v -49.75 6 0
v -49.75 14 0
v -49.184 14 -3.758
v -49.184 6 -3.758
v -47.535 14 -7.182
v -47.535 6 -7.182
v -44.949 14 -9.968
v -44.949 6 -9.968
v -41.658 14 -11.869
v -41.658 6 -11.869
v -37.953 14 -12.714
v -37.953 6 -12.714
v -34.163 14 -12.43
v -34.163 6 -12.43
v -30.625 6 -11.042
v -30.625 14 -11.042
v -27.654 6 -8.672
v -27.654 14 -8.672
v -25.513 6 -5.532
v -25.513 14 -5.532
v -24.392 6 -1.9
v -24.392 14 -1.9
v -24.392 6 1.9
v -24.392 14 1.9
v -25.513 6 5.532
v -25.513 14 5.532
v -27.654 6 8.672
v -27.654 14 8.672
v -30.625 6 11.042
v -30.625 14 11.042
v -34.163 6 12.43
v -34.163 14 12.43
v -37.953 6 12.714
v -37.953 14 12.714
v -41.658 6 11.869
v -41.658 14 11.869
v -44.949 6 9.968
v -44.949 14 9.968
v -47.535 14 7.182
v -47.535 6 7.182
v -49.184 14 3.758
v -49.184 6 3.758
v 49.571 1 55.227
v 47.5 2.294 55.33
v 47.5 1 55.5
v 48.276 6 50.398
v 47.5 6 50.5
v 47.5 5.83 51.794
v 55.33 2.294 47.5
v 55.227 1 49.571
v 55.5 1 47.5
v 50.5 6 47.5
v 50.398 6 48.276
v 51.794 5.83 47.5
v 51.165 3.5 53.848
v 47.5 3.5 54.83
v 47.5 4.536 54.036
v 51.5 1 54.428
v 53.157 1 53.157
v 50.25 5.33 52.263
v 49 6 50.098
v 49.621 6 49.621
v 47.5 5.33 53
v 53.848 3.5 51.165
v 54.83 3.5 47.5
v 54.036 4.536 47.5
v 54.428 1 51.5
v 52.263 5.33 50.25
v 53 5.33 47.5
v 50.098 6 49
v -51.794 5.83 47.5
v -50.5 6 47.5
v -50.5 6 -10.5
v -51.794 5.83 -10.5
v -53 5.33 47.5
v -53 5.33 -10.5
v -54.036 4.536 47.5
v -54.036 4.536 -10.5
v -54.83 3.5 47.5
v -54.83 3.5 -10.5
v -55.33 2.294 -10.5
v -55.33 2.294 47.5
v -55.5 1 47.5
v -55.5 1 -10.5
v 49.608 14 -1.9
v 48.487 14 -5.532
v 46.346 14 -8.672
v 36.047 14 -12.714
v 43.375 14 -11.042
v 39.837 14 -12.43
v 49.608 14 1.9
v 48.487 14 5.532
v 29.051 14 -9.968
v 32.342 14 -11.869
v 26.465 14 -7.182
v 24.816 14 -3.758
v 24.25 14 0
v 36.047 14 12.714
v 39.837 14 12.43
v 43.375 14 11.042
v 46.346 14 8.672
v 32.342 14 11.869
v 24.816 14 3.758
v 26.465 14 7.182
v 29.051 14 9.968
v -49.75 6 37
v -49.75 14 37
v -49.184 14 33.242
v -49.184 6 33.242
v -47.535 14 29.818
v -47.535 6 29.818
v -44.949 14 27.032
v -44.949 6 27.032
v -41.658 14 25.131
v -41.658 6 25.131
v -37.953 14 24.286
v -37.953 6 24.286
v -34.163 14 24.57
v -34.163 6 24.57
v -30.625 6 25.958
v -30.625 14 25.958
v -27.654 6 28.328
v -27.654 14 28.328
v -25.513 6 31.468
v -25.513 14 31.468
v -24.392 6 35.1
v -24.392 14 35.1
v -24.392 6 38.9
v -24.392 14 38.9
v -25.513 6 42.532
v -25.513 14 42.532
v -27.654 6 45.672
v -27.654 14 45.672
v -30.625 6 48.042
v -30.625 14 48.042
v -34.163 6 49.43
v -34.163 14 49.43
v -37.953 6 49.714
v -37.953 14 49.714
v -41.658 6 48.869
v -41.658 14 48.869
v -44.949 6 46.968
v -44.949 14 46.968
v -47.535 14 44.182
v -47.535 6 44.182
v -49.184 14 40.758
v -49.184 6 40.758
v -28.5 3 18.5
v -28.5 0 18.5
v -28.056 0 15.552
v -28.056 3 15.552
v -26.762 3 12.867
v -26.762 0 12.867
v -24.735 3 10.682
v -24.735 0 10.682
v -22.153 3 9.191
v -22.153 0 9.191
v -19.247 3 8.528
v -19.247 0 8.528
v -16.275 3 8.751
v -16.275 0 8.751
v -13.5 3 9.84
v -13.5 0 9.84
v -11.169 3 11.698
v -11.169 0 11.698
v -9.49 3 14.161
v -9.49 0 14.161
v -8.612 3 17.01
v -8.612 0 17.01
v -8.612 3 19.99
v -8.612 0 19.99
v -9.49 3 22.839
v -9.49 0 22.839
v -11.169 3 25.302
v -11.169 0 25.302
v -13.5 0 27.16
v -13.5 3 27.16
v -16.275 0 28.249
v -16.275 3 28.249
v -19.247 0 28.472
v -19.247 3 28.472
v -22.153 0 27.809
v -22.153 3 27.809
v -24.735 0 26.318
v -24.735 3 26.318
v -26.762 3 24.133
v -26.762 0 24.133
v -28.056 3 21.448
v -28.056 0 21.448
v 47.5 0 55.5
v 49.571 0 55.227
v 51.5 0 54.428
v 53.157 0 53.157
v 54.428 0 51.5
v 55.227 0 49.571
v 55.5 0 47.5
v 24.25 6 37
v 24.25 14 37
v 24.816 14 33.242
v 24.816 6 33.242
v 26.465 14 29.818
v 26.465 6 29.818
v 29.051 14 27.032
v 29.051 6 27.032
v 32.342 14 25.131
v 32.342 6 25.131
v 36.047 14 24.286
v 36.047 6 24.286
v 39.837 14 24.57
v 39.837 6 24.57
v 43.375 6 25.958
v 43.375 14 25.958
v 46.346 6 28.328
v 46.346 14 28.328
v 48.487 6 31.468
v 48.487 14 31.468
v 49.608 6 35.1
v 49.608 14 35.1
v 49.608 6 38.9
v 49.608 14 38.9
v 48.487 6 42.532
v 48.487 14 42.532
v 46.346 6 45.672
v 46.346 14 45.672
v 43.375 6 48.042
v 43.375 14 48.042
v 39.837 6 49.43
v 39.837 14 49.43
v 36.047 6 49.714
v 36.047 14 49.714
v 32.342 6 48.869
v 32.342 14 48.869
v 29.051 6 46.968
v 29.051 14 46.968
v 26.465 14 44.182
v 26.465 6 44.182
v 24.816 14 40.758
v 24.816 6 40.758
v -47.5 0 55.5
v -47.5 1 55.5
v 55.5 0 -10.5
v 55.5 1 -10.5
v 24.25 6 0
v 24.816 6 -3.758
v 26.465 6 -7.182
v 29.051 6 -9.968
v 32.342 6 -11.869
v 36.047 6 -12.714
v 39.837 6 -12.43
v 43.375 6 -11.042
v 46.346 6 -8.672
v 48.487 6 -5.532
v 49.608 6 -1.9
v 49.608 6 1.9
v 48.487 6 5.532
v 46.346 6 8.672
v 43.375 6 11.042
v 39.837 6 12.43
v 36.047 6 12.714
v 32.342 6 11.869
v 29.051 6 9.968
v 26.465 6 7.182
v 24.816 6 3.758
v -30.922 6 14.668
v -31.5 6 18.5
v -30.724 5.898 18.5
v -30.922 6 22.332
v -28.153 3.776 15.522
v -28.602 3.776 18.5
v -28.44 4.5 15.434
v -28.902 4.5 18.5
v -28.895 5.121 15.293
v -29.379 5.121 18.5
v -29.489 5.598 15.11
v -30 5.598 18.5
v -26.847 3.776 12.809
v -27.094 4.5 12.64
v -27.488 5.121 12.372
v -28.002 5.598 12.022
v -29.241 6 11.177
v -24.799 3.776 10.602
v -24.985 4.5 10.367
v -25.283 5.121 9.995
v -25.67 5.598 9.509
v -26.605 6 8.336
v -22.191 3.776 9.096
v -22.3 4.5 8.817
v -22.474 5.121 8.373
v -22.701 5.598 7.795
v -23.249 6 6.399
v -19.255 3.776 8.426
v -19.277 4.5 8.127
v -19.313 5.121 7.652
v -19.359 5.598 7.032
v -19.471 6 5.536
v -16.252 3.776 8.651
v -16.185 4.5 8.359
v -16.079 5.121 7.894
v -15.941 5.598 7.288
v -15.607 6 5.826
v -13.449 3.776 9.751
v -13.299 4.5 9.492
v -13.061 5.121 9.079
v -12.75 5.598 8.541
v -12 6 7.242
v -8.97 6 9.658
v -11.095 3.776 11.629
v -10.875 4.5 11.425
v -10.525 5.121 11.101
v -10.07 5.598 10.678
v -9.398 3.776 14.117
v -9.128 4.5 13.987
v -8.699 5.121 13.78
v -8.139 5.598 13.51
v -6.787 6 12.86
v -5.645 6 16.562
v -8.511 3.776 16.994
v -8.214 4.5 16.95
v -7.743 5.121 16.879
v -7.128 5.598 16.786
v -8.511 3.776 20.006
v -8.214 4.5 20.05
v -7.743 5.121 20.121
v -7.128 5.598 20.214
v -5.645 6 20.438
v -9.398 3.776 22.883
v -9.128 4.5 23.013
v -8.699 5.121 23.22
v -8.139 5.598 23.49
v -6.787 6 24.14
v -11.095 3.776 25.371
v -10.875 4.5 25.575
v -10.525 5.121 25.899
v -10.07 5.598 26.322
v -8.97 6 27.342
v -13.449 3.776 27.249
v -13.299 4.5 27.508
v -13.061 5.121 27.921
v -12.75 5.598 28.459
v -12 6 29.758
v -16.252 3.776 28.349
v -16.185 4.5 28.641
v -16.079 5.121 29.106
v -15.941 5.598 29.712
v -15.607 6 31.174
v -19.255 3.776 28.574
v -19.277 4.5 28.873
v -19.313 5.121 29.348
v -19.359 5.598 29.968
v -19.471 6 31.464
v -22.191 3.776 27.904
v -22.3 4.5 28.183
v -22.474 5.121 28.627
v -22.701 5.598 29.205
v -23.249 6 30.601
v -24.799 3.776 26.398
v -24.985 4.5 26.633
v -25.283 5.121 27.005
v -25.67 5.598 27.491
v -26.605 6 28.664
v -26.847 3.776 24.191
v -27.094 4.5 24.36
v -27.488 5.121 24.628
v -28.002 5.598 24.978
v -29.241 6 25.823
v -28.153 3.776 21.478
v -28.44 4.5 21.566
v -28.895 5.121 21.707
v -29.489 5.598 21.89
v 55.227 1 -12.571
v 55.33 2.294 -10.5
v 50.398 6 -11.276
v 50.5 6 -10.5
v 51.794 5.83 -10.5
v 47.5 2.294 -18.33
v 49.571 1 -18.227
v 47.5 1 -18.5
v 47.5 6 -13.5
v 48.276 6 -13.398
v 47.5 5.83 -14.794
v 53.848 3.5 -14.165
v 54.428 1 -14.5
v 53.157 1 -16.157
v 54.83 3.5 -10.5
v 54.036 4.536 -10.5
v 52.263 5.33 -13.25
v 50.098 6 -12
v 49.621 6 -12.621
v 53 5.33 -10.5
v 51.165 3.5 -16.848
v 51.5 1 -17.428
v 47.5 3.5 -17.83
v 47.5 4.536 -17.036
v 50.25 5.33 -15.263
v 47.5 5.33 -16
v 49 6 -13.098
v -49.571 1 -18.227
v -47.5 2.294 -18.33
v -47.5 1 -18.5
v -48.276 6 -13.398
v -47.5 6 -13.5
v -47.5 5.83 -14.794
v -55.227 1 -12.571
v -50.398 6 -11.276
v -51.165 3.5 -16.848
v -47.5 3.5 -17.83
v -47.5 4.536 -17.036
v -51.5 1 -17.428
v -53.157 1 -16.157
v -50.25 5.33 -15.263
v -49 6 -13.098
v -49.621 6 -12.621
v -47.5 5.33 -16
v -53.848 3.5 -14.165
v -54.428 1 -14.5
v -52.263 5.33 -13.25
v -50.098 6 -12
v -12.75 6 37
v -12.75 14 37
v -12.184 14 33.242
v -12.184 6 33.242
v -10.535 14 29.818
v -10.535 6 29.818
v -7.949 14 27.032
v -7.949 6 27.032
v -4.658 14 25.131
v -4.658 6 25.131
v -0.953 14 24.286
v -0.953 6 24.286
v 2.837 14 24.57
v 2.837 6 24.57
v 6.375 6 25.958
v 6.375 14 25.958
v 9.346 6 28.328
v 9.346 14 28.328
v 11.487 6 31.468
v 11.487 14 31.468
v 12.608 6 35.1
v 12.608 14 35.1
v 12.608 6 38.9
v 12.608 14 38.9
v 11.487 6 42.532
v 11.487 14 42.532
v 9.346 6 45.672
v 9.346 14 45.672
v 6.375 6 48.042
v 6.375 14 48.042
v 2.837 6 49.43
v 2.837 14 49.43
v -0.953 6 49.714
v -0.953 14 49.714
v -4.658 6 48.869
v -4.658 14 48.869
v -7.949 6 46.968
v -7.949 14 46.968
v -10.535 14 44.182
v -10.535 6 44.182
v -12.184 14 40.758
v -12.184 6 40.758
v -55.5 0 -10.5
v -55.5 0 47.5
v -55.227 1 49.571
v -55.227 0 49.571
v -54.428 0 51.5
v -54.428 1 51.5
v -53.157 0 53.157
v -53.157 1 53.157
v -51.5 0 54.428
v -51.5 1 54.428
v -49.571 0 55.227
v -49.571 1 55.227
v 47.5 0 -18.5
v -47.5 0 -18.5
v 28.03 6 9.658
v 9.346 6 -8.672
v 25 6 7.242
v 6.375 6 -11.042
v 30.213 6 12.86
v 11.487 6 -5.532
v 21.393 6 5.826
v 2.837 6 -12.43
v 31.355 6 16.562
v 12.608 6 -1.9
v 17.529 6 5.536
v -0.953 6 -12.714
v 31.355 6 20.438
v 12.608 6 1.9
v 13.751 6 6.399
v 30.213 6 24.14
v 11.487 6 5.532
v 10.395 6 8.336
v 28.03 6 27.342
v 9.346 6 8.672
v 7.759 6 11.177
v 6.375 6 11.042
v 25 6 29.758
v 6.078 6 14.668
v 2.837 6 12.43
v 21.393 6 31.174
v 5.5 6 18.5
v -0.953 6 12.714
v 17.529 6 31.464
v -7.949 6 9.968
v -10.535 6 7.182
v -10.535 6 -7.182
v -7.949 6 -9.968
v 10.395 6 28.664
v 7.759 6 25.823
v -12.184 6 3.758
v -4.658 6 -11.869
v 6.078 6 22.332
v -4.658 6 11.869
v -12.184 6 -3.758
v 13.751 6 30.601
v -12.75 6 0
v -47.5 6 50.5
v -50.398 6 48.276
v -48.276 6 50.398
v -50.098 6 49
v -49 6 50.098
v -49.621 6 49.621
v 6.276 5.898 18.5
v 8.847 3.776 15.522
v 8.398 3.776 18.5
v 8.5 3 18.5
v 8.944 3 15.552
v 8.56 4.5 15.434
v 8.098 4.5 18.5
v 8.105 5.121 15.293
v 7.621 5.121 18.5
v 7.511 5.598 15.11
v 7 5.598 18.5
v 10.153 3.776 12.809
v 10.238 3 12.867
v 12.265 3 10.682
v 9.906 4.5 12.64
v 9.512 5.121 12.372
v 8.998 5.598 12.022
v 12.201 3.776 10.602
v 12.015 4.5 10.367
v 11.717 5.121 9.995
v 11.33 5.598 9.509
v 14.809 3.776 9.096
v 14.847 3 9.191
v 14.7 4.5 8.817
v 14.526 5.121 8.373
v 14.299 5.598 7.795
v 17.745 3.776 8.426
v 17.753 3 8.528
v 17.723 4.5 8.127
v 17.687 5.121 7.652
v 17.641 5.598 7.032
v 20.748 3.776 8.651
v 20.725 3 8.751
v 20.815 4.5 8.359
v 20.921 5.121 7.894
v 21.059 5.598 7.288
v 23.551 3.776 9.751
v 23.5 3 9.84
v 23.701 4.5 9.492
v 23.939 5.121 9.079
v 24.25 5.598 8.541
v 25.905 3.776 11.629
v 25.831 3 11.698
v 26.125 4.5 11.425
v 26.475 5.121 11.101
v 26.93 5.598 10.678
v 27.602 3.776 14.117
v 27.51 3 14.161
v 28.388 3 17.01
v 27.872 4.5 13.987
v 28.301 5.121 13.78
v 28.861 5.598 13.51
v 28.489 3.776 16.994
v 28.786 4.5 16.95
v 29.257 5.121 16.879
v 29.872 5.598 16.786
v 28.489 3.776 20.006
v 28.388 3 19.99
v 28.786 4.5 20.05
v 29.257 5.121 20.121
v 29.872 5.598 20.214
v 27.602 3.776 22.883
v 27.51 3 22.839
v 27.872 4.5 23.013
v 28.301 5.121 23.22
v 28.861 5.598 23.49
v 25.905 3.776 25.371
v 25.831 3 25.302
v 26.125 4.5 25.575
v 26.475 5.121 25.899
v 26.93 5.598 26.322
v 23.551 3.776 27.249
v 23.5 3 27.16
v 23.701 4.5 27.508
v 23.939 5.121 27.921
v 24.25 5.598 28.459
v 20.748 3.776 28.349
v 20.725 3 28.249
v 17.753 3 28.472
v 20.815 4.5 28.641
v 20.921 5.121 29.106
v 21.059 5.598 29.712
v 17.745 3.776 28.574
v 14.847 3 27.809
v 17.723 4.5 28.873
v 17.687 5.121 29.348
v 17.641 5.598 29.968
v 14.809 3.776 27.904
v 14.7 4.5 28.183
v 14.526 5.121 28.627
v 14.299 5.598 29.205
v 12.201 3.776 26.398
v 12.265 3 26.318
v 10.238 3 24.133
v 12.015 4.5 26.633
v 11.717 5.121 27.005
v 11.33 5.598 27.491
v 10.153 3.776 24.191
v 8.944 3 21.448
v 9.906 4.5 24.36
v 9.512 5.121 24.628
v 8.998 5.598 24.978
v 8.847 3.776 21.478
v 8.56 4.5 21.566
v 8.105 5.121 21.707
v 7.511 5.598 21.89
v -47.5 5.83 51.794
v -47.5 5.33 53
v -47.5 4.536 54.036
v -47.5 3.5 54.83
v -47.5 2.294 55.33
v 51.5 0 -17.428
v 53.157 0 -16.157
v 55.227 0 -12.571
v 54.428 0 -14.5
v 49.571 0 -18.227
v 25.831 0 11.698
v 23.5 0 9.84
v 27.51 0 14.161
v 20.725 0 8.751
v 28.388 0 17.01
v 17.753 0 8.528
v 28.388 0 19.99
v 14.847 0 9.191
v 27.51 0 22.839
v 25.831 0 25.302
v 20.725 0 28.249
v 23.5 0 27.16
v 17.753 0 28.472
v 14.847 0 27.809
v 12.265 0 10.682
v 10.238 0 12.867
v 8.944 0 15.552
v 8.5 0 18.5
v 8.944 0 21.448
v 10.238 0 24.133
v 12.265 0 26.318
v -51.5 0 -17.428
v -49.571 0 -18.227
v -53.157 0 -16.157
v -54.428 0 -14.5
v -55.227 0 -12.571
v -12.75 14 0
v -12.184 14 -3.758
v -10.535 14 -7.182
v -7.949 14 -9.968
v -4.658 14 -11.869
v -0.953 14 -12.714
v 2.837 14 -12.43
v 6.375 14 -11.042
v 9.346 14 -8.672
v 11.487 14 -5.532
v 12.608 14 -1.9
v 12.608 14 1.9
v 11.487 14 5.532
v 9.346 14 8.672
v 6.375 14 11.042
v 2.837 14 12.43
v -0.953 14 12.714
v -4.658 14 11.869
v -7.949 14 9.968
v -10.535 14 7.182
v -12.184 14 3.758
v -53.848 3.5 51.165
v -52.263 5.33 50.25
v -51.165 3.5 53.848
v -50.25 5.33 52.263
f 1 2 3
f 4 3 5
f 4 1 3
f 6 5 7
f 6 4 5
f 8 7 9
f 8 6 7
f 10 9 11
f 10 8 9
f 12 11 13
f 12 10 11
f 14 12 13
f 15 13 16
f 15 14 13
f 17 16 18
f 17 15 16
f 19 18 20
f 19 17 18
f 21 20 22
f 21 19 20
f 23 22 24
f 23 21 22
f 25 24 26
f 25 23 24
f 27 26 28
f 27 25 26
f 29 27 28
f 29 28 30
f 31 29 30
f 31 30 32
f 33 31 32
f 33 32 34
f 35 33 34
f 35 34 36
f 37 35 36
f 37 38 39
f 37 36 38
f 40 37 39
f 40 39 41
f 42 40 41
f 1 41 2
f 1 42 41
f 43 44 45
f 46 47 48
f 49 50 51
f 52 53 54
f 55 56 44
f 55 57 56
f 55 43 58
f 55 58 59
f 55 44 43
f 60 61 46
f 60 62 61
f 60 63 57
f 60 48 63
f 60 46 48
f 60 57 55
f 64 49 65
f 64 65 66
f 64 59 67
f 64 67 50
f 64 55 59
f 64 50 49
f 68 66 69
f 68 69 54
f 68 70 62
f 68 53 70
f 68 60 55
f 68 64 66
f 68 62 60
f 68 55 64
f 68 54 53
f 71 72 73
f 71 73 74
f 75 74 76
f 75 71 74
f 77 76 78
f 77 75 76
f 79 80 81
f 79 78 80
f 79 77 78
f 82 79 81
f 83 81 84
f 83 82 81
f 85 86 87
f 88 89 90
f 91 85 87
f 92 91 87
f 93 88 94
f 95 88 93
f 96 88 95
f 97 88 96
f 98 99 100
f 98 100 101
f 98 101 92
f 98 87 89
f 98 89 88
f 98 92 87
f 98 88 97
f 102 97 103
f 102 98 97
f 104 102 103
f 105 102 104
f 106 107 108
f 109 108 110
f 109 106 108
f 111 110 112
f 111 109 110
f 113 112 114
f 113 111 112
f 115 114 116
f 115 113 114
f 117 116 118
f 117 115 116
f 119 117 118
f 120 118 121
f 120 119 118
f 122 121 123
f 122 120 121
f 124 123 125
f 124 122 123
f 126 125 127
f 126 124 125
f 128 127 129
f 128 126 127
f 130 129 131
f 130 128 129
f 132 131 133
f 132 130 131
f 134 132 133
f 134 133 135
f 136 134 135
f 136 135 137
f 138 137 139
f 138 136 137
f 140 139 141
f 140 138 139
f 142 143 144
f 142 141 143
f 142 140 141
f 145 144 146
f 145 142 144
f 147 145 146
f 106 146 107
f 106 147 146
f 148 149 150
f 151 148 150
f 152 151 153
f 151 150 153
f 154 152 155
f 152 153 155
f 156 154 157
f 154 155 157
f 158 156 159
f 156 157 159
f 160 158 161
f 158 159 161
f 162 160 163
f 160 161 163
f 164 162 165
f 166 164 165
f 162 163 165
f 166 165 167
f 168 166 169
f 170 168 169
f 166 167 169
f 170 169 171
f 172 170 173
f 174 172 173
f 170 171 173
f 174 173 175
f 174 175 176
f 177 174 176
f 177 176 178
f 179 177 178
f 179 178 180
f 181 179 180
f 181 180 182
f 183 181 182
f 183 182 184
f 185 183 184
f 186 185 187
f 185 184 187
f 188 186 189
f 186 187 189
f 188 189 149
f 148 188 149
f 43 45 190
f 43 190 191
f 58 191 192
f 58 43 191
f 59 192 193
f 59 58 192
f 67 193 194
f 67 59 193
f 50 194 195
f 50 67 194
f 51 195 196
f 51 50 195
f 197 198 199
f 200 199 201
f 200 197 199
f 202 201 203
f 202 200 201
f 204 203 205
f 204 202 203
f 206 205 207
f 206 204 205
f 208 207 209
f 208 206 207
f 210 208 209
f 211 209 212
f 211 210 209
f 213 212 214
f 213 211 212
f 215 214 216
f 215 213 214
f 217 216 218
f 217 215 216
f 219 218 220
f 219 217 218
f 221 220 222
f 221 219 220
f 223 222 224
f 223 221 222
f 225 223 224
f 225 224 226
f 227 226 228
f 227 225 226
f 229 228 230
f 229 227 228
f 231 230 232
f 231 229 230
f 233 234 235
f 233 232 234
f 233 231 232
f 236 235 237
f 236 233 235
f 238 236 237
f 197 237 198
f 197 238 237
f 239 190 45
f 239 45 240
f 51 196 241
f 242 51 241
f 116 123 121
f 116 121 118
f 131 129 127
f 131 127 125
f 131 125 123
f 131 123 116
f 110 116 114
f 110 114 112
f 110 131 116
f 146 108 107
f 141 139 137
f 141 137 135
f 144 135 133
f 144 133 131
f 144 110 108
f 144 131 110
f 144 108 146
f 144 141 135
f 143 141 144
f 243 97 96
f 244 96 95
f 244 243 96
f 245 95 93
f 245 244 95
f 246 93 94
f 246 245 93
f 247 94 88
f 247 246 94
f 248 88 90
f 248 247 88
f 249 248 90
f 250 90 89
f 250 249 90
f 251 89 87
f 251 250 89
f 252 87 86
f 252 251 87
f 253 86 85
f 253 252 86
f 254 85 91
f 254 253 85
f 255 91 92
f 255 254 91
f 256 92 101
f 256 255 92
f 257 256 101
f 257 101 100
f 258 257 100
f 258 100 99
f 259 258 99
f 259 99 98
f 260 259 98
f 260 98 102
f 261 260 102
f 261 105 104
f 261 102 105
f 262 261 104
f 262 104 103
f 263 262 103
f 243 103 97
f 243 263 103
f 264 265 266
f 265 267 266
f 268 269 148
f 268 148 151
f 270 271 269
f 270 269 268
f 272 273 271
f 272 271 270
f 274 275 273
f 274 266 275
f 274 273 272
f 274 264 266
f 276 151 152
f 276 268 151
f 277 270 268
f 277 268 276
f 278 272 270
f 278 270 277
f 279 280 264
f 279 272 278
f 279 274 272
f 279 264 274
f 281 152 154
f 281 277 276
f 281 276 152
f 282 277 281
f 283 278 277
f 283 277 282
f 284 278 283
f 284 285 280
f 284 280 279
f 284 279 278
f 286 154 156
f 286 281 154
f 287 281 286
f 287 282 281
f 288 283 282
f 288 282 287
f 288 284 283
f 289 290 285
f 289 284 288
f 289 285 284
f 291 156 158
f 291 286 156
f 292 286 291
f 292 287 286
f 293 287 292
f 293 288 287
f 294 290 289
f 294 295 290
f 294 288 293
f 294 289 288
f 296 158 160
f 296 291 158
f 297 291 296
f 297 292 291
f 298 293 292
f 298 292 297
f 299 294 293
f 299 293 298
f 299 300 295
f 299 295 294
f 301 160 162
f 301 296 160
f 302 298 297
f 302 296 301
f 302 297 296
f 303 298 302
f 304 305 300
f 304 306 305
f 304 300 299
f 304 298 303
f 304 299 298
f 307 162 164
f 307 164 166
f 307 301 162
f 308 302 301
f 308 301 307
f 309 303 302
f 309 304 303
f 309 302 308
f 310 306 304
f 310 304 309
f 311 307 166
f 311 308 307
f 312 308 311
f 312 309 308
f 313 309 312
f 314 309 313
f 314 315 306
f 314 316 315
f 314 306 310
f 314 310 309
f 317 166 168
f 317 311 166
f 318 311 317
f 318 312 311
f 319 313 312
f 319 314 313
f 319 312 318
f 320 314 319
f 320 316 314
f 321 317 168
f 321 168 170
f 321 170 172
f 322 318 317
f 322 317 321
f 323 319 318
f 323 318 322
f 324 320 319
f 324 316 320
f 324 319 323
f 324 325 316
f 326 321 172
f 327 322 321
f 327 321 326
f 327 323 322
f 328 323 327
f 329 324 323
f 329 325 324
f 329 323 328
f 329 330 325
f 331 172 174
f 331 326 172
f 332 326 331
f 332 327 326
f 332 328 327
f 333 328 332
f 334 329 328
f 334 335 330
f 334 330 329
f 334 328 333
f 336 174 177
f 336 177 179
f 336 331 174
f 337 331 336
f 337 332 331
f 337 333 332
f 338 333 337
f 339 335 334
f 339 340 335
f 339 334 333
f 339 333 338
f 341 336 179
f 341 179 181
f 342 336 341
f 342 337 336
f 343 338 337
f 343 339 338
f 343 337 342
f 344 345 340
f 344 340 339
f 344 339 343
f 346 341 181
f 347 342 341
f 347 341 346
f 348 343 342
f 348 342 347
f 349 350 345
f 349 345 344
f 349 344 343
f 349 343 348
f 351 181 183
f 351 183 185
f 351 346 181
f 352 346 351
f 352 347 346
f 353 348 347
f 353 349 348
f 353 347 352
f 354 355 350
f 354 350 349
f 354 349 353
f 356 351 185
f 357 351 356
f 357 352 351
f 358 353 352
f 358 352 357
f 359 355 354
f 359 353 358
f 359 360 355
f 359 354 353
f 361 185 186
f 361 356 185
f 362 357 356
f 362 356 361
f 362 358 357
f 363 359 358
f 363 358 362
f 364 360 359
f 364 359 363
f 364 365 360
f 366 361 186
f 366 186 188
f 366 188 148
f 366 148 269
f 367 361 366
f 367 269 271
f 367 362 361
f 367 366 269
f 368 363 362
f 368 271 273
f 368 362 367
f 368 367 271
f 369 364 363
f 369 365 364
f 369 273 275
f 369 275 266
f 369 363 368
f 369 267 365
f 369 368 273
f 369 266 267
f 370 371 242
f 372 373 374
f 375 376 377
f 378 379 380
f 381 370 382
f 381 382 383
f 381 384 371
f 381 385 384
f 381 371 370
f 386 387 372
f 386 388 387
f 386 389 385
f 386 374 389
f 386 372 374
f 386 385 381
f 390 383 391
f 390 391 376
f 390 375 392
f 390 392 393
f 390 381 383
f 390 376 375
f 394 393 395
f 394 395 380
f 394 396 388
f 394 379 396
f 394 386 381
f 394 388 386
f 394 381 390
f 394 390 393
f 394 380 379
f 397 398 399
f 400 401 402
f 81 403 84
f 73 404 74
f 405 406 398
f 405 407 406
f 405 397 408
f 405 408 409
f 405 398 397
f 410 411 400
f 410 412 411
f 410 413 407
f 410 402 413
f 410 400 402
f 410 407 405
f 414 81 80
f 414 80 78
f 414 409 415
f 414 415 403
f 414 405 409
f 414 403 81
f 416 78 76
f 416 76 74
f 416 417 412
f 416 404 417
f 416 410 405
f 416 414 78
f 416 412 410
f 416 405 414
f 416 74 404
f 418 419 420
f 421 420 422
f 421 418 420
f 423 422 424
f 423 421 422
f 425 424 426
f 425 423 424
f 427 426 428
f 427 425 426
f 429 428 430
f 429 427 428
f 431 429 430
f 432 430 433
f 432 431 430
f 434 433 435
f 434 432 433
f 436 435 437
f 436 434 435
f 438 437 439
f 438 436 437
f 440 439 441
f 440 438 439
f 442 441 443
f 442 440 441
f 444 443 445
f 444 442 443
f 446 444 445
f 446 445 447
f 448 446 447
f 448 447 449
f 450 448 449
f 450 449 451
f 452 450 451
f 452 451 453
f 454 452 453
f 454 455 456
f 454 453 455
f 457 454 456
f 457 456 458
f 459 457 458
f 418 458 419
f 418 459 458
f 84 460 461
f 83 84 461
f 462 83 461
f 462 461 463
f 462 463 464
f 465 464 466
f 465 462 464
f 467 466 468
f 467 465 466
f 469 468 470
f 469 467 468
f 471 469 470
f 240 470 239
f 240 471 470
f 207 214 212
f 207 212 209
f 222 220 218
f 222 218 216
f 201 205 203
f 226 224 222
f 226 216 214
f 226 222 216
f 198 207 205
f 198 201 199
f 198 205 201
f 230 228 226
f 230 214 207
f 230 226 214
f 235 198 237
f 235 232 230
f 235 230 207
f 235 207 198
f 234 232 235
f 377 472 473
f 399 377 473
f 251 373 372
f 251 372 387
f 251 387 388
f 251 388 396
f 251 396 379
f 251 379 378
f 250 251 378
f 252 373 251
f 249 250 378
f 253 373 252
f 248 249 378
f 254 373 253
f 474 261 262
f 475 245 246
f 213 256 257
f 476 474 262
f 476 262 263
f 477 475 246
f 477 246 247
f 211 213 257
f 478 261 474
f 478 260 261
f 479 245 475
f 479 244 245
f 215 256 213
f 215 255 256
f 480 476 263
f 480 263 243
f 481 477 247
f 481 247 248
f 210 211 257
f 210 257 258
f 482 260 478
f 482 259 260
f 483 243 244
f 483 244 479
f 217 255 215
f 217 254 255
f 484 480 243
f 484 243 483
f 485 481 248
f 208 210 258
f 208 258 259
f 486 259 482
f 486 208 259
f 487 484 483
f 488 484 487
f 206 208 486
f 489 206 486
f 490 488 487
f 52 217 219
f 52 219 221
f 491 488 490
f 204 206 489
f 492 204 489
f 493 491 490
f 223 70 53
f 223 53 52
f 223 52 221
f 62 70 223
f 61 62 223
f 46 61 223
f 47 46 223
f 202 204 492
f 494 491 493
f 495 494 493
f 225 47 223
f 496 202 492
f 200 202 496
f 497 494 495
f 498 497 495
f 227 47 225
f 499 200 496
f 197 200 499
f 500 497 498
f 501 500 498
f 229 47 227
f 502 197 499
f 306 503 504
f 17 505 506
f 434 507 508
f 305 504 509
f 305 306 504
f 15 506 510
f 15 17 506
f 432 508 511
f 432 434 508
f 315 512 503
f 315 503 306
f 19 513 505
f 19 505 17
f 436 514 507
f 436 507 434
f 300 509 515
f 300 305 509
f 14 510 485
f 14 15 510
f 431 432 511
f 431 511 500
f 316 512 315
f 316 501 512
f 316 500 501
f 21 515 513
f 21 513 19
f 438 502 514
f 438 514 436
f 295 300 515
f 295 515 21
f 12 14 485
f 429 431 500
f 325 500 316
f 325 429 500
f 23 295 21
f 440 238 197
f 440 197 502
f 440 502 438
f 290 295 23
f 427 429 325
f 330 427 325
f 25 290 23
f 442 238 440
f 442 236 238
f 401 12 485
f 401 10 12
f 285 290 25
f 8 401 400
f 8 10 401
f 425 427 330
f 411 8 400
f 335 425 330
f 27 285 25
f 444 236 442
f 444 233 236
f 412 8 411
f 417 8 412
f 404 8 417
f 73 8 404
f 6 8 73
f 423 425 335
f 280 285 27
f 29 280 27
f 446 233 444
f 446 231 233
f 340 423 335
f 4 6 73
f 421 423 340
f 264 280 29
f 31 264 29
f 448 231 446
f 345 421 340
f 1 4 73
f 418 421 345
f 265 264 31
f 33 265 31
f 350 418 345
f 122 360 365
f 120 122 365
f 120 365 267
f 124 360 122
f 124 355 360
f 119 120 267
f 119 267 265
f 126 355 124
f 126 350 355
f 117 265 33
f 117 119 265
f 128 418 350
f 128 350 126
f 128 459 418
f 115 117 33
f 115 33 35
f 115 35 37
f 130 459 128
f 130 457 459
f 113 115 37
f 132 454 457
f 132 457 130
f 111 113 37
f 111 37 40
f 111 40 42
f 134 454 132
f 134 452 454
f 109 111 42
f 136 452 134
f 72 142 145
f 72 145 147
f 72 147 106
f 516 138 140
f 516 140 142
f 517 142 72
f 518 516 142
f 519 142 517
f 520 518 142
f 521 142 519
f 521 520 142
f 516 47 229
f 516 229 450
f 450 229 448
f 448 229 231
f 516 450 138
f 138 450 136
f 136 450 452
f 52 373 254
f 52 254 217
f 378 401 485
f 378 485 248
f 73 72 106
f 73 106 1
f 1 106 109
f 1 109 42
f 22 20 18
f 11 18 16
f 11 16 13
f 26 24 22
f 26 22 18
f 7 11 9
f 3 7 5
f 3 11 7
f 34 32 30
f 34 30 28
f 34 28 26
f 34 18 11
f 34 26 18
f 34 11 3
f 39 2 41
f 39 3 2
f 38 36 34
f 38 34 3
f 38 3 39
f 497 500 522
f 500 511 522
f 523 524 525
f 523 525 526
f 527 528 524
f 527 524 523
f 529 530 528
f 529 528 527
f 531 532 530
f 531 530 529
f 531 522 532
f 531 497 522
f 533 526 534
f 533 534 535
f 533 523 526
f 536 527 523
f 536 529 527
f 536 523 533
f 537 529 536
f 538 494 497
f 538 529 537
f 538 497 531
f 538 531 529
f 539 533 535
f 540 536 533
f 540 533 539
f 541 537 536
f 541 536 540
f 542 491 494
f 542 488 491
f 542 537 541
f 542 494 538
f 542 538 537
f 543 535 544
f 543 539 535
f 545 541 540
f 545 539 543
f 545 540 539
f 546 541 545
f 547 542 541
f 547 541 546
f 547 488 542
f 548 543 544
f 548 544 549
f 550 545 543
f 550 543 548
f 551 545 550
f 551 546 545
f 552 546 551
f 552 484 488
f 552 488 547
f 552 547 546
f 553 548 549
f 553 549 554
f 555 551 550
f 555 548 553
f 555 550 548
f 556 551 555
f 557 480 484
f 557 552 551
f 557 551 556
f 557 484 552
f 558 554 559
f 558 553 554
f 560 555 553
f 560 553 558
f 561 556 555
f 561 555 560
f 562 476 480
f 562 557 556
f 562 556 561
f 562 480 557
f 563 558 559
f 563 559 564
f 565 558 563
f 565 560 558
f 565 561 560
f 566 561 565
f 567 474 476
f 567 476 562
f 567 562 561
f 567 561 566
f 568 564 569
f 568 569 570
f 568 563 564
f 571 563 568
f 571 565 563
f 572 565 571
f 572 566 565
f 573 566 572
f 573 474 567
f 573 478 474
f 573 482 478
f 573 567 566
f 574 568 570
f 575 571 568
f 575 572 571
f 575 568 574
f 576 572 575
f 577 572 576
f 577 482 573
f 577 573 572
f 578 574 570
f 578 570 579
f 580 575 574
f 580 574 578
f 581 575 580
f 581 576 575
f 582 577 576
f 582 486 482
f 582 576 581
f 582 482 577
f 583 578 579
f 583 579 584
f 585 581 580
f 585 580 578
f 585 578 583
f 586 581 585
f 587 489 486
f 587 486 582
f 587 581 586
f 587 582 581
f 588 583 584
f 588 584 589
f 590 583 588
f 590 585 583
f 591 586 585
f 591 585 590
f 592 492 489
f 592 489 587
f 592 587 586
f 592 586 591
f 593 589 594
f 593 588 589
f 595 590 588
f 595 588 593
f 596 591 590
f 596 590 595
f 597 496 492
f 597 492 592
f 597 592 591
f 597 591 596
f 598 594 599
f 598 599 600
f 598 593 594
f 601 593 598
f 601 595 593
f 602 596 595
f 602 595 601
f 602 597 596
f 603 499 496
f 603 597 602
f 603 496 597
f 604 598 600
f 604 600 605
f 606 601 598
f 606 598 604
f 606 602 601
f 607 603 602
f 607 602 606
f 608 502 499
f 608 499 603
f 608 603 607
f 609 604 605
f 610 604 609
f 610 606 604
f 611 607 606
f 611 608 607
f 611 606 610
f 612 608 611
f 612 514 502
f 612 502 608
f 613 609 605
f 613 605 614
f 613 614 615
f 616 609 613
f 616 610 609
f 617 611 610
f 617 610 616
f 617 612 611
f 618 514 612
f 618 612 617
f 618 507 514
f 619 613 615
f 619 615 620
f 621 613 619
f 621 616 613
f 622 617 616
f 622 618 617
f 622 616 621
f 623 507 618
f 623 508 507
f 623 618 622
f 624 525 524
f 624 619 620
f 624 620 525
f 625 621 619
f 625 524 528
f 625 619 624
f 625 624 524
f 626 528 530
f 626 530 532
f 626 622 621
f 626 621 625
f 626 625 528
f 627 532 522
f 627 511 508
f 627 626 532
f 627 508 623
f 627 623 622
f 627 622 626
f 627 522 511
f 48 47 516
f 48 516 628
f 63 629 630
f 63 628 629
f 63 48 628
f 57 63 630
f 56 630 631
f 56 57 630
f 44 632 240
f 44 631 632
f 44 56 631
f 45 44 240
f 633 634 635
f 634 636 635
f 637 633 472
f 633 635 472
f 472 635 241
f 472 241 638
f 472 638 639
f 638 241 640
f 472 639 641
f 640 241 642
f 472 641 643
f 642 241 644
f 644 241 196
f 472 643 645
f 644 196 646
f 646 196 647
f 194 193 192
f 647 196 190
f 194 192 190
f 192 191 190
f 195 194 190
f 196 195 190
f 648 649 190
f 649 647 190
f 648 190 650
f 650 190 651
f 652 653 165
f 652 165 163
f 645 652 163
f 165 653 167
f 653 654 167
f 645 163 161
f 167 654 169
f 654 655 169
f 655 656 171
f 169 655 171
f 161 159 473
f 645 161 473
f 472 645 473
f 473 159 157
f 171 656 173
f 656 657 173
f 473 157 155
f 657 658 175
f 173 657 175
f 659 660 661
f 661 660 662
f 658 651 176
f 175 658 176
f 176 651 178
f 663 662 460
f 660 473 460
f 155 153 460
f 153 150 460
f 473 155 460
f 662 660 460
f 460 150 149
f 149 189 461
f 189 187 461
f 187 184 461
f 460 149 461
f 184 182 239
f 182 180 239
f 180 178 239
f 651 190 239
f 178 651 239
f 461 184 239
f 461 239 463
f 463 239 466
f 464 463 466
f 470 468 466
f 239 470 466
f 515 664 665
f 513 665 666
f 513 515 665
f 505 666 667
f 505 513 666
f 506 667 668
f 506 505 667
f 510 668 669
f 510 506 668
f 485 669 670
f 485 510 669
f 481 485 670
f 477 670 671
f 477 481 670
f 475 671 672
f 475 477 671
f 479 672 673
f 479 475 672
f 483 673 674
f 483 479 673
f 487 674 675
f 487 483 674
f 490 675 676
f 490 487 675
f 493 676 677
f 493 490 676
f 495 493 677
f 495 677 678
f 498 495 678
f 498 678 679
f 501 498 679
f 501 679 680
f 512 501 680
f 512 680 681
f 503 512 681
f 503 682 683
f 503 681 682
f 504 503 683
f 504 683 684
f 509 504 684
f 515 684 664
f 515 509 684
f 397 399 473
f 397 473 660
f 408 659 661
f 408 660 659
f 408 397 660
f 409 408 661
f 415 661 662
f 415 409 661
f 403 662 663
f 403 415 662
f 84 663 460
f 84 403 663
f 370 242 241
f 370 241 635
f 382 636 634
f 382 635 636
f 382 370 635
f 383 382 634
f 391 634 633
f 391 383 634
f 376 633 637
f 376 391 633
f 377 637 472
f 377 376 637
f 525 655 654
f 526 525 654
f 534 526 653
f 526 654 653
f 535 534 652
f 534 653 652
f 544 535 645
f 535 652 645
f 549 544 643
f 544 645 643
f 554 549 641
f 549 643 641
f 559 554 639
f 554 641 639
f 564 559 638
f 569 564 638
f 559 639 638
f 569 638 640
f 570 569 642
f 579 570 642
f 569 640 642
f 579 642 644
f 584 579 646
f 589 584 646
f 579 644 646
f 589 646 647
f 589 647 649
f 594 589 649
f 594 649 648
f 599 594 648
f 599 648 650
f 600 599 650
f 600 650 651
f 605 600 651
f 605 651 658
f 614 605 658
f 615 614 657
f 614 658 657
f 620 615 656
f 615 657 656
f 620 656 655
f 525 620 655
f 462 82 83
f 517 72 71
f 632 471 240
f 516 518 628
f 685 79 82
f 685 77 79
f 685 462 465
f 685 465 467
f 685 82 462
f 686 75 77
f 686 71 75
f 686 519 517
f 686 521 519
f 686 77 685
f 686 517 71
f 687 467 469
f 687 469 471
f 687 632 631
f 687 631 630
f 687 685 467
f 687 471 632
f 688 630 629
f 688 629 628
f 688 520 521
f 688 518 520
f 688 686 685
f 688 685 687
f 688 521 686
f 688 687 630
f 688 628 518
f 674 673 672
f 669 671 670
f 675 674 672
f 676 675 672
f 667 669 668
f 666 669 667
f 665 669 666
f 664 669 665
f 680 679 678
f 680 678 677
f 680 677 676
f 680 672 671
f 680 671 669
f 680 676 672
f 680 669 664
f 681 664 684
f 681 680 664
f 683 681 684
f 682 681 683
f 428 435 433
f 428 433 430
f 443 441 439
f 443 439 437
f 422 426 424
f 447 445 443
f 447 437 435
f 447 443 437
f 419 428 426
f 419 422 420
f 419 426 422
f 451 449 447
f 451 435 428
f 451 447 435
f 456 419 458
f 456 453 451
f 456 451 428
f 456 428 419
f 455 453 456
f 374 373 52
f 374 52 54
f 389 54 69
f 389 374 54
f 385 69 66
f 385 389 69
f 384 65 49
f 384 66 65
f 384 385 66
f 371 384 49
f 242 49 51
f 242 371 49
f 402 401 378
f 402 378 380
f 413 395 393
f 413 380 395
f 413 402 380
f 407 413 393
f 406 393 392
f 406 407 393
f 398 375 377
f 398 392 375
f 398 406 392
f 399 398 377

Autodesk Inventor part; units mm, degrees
ref_plane "YZ Plane" through (0, 0, 0) normal (1, 0, 0) x (0, 1, 0)
ref_plane "XZ Plane" through (0, 0, 0) normal (0, 1, 0) x (-1, 0, 0)
ref_plane "XY Plane" through (0, 0, 0) normal (0, 0, 1) x (1, 0, 0)
sketch "Sketch1" plane through (0, 0, 0) normal (0, 1, 0) x (-1, 0, 0)
  line L0 (25.9, 0) -> (-25.9, 0) projected
  line L1 (0, -25.9) -> (0, 25.9) projected
  circle A0 centre (0, 0) radius 18.5 construction
  circle A1 centre (0, 0) radius 13 construction
  dimension "d0" = 37
  dimension "d1" = 26
sketch "Sketch2" plane through (0, 0, 0) normal (0, 1, 0) x (-1, 0, 0)
  line L0 (77.7, 0) -> (-77.7, 0) projected
  line L1 (0, -33.3) -> (0, 70.3) projected
  line L2 (-55.5, 55.5) -> (-55.5, -18.5)
  line L3 (-55.5, -18.5) -> (55.5, -18.5)
  line L4 (55.5, -18.5) -> (55.5, 55.5)
  line L5 (-55.5, 55.5) -> (55.5, 55.5)
  circle A0 centre (0, 37) radius 18.5 construction
  point P0 (0, 0)
  dimension "d3" = 111
  dimension "d29" = 18.5
  dimension "d30" = 55.5
  dimension "d99" = 37
  dimension "d100" = 37
extrude "Extrusion1" add sketch "Sketch2" along normal blind 6
sketch "Sketch6" plane through (0, 0, 0) normal (0, 1, 0) x (-1, 0, 0)
  line L0 (55.5, -18.5) -> (-55.5, -18.5) projected
  line L1 (55.5, 55.5) -> (55.5, -18.5) projected
  line L2 (-55.5, -18.5) -> (55.5, -18.5)
  line L3 (55.5, -18.5) -> (55.5, 55.5)
  line L4 (-55.5, 55.5) -> (-55.5, -18.5)
  line L5 (84.7, 0) -> (-84.7, 0) projected
  line L6 (0, -36.3) -> (0, 70.8) projected
  arc A0 (-16, 0) -> (16, 0) centre (0, 0) ccw
  line L7 (16, 0) -> (16, 55.5)
  line L8 (55.5, 55.5) -> (-55.5, 55.5) projected
  line L9 (16, 55.5) -> (55.5, 55.5)
  line L10 (-16, 0) -> (-16, 55.5)
  line L11 (-16, 55.5) -> (-55.5, 55.5)
  point P0 (-17.3617, -21)
  dimension "d18" = 32
extrude "Extrusion5" [suppressed]
sketch "Sketch4" plane through (0, 0, 0) normal (0, 0, 1) x (1, 0, 0)
  line L0 (-18.5, 0) -> (18.5, 0)
  line L1 (18.5, 0) -> (18.5, -2)
  line L2 (18.5, -2) -> (-18.5, -2)
  line L3 (-18.5, -2) -> (-18.5, 0)
  line L4 (-25.9, 0) -> (25.9, 0) projected
  line L5 (0, -2.4) -> (0, 0.4) projected
  point P0 (0, 0)
  dimension "d10" = 37
  dimension "d11" = 2
extrude "Extrusion6" [suppressed]
sketch "Sketch5" plane through (0, 0, 0) normal (0, 1, 0) x (-1, 0, 0)
  circle A0 centre (0, 0) radius 18.5 construction
  circle A1 centre (0, 0) radius 18.5 construction
  line L0 (25.9, 0) -> (-25.9, 0) projected
  line L1 (0, -28.9) -> (0, 26.4) projected
  line L2 (-18.5, -21) -> (18.5, -21)
  line L3 (18.5, -21) -> (18.5, -18.5)
  line L4 (18.5, -18.5) -> (-18.5, -18.5)
  line L5 (-18.5, -18.5) -> (-18.5, -21)
  dimension "d25" = 37
  dimension "d26" = 21
extrude "Extrusion7" [suppressed]
sketch "Sketch7" plane through (0, 0, 0) normal (0, 0, 1) x (1, 0, 0)
  line L0 (-18.5, 0) -> (18.5, 0)
  line L1 (18.5, 0) -> (18.5, -2)
  line L2 (18.5, -2) -> (-18.5, -2)
  line L3 (-18.5, -2) -> (-18.5, 0)
  line L4 (55.5, 0) -> (-55.5, 0) projected
  line L5 (-84.7, 0) -> (84.7, 0) projected
  line L6 (0, -2.4) -> (0, 0.4) projected
  point P0 (-16, 0)
  point P1 (16, 0)
  dimension "d53" = 2
  dimension "d54" = 18.5
extrude "Extrusion8" [suppressed]
sketch "Sketch8" plane through (0, 0, 0) normal (0, 1, 0) x (-1, 0, 0)
  circle A0 centre (0, 0) radius 12.75
  dimension "d34" = 25.5
extrude "Extrusion9" add sketch "Sketch8" along normal blind 14
pattern_linear "Rectangular Pattern1" count 2 spacing 37 along (0, 0, 1) count 3 spacing 37 along (1, 0, 0) of "Extrusion9" second direction both ways yes
sketch "Sketch9" plane through (0, 6, 0) normal (0, 1, 0) x (1, 0, 0)
  circle A0 centre (0, 0) radius 13
  circle A1 centre (0, 0) radius 15
  dimension "d40" = 26
  dimension "d41" = 30
extrude "Extrusion10" [suppressed]
sketch "Sketch10" plane through (0, 5, 0) normal (0, 1, 0) x (1, 0, 0)
  arc A0 (16, 0) -> (-16, 0) centre (0, 0) ccw projected
  line L0 (1.5, -18) -> (-1.5, -18)
  line L1 (-29.4, 0) -> (29.4, 0) projected
  line L2 (0, 36.3) -> (0, -70.8) projected
  line L3 (1.5, -12) -> (-1.5, -12)
  line L4 (1.5, -12) -> (1.5, -18)
  line L5 (-1.5, -18) -> (-1.5, -12)
  dimension "d48" = 3
  dimension "d49" = 12
  dimension "d50" = 6
extrude "Extrusion11" [suppressed]
fillet "Fillet1" [suppressed]
sketch "Sketch11" plane through (0, 0, 0) normal (0, 1, 0) x (-1, 0, 0)
  line L0 (-60.5, -21) -> (60.5, -21)
  line L1 (60.5, -21) -> (60.5, -47)
  line L2 (60.5, -47) -> (-60.5, -47)
  line L3 (-60.5, -47) -> (-60.5, -21)
  line L4 (84.7, 0) -> (-84.7, 0) projected
  line L5 (0, -60.1) -> (0, 31.6) projected
  point P0 (0, 0)
  dimension "d57" = 26
  dimension "d58" = 21
  dimension "d59" = 121
extrude "Extrusion12" [suppressed]
sketch "Sketch12" plane through (0, 0, 0) normal (1, 0, 0) x (0, 1, 0)
  line L0 (6, 55.5) -> (6, -18.5) projected
  arc A0 (6, -16.5081) -> (5.7334, -47) centre (34, -32) ccw
  line L1 (-6.8, 0) -> (40.8, 0) projected
  line L2 (0, -67.5) -> (0, 76) projected
  line L3 (6, -16.5081) -> (6, -47)
  line L4 (6, -47) -> (5.7334, -47)
  line L5 (0, -47) -> (6, -47) projected
  point P0 (0, 0)
  point P1 (6, 48)
  dimension "d62" = 32
  dimension "d63" = 32
  dimension "d64" = 34
extrude "Extrusion13" [suppressed]
fillet "Fillet3" [suppressed]
sketch "Sketch13" plane through (0, 0, 0) normal (0, 1, 0) x (-1, 0, 0)
  line L0 (84.7, 0) -> (-84.7, 0) projected
  line L1 (0, -67.5) -> (0, 76) projected
  line L2 (55.5, 55.5) -> (55.5, -18.5) projected
  arc A0 (13.0815, 23.9185) -> (13.0815, 13.0815) centre (18.5, 18.5) ccw
  line L3 (-55.5, 55.5) -> (-55.5, -18.5) projected
  arc A1 (-13.0815, 13.0815) -> (-13.0815, 23.9185) centre (-18.5, 18.5) ccw
  line L4 (18.5, 37) -> (18.5, 0)
  line L5 (-18.5, 0) -> (-18.5, 37)
  line L6 (18.5, 37) -> (18.5, 55.5)
  line L7 (-55.5, 55.5) -> (55.5, 55.5) projected
  line L8 (-18.5, 55.5) -> (-18.5, 37)
  arc A2 (-9.2871, 53) -> (-13.0815, 23.9185) centre (0, 37) ccw
  arc A3 (13.0815, 23.9185) -> (9.2871, 53) centre (0, 37) ccw
  arc A4 (-13.0815, 13.0815) -> (-18.5, 0) centre (0, 0) ccw
  arc A5 (18.5, 0) -> (13.0815, 13.0815) centre (0, 0) ccw
  point P0 (60.5, -39.254)
  point P1 (-55.5, 48)
  point P2 (-60.5, -16.5081)
  point P3 (-60.5, -47)
  point P4 (55.5, -18.5)
  point P5 (-55.5, -18.5)
  dimension "d68" = 37
  dimension "d71" = 18.5
  dimension "d72" = 18.5
  dimension "d73" = 7.663
  dimension "d74" = 7.663
  dimension "d75" = 18.5
  dimension "d76" = 18.5
  dimension "d77" = 18.5
  dimension "d78" = 18.5
extrude "Extrusion14" [suppressed]
sketch "Sketch14" plane through (0, 0, 0) normal (0, 1, 0) x (-1, 0, 0)
  circle A0 centre (18.5, 18.5) radius 10
  line L0 (39.9, 0) -> (-39.9, 0) projected
  line L1 (0, -27.9) -> (0, 37.9) projected
  circle A1 centre (-18.5, 18.5) radius 10
  point P0 (0, 0)
  dimension "d84" = 18.5
  dimension "d85" = 18.5
  dimension "d86" = 20
  dimension "d89" = 37
extrude "Extrusion15" cut sketch "Sketch14" along normal through all
fillet "Fillet4" radius 3 2 edges at (-8.5, 6, 18.5) (28.5, 6, 18.5)
fillet "Fillet5" radius 8 4 edges at (-55.5, 3, 55.5) (55.5, 3, 55.5) (-55.5, 3, -18.5) (55.5, 3, -18.5)
fillet "Fillet6" radius 5 5 edges at (53.1569, 6, 53.1569) (55.5, 6, 18.5) (-53.1569, 6, 53.1569) (-55.5, 6, 18.5) (0, 6, 55.5)
equation "\"d85\" = d84"
properties part number "NespressoSpeedfiller-6X-long-tamper"
